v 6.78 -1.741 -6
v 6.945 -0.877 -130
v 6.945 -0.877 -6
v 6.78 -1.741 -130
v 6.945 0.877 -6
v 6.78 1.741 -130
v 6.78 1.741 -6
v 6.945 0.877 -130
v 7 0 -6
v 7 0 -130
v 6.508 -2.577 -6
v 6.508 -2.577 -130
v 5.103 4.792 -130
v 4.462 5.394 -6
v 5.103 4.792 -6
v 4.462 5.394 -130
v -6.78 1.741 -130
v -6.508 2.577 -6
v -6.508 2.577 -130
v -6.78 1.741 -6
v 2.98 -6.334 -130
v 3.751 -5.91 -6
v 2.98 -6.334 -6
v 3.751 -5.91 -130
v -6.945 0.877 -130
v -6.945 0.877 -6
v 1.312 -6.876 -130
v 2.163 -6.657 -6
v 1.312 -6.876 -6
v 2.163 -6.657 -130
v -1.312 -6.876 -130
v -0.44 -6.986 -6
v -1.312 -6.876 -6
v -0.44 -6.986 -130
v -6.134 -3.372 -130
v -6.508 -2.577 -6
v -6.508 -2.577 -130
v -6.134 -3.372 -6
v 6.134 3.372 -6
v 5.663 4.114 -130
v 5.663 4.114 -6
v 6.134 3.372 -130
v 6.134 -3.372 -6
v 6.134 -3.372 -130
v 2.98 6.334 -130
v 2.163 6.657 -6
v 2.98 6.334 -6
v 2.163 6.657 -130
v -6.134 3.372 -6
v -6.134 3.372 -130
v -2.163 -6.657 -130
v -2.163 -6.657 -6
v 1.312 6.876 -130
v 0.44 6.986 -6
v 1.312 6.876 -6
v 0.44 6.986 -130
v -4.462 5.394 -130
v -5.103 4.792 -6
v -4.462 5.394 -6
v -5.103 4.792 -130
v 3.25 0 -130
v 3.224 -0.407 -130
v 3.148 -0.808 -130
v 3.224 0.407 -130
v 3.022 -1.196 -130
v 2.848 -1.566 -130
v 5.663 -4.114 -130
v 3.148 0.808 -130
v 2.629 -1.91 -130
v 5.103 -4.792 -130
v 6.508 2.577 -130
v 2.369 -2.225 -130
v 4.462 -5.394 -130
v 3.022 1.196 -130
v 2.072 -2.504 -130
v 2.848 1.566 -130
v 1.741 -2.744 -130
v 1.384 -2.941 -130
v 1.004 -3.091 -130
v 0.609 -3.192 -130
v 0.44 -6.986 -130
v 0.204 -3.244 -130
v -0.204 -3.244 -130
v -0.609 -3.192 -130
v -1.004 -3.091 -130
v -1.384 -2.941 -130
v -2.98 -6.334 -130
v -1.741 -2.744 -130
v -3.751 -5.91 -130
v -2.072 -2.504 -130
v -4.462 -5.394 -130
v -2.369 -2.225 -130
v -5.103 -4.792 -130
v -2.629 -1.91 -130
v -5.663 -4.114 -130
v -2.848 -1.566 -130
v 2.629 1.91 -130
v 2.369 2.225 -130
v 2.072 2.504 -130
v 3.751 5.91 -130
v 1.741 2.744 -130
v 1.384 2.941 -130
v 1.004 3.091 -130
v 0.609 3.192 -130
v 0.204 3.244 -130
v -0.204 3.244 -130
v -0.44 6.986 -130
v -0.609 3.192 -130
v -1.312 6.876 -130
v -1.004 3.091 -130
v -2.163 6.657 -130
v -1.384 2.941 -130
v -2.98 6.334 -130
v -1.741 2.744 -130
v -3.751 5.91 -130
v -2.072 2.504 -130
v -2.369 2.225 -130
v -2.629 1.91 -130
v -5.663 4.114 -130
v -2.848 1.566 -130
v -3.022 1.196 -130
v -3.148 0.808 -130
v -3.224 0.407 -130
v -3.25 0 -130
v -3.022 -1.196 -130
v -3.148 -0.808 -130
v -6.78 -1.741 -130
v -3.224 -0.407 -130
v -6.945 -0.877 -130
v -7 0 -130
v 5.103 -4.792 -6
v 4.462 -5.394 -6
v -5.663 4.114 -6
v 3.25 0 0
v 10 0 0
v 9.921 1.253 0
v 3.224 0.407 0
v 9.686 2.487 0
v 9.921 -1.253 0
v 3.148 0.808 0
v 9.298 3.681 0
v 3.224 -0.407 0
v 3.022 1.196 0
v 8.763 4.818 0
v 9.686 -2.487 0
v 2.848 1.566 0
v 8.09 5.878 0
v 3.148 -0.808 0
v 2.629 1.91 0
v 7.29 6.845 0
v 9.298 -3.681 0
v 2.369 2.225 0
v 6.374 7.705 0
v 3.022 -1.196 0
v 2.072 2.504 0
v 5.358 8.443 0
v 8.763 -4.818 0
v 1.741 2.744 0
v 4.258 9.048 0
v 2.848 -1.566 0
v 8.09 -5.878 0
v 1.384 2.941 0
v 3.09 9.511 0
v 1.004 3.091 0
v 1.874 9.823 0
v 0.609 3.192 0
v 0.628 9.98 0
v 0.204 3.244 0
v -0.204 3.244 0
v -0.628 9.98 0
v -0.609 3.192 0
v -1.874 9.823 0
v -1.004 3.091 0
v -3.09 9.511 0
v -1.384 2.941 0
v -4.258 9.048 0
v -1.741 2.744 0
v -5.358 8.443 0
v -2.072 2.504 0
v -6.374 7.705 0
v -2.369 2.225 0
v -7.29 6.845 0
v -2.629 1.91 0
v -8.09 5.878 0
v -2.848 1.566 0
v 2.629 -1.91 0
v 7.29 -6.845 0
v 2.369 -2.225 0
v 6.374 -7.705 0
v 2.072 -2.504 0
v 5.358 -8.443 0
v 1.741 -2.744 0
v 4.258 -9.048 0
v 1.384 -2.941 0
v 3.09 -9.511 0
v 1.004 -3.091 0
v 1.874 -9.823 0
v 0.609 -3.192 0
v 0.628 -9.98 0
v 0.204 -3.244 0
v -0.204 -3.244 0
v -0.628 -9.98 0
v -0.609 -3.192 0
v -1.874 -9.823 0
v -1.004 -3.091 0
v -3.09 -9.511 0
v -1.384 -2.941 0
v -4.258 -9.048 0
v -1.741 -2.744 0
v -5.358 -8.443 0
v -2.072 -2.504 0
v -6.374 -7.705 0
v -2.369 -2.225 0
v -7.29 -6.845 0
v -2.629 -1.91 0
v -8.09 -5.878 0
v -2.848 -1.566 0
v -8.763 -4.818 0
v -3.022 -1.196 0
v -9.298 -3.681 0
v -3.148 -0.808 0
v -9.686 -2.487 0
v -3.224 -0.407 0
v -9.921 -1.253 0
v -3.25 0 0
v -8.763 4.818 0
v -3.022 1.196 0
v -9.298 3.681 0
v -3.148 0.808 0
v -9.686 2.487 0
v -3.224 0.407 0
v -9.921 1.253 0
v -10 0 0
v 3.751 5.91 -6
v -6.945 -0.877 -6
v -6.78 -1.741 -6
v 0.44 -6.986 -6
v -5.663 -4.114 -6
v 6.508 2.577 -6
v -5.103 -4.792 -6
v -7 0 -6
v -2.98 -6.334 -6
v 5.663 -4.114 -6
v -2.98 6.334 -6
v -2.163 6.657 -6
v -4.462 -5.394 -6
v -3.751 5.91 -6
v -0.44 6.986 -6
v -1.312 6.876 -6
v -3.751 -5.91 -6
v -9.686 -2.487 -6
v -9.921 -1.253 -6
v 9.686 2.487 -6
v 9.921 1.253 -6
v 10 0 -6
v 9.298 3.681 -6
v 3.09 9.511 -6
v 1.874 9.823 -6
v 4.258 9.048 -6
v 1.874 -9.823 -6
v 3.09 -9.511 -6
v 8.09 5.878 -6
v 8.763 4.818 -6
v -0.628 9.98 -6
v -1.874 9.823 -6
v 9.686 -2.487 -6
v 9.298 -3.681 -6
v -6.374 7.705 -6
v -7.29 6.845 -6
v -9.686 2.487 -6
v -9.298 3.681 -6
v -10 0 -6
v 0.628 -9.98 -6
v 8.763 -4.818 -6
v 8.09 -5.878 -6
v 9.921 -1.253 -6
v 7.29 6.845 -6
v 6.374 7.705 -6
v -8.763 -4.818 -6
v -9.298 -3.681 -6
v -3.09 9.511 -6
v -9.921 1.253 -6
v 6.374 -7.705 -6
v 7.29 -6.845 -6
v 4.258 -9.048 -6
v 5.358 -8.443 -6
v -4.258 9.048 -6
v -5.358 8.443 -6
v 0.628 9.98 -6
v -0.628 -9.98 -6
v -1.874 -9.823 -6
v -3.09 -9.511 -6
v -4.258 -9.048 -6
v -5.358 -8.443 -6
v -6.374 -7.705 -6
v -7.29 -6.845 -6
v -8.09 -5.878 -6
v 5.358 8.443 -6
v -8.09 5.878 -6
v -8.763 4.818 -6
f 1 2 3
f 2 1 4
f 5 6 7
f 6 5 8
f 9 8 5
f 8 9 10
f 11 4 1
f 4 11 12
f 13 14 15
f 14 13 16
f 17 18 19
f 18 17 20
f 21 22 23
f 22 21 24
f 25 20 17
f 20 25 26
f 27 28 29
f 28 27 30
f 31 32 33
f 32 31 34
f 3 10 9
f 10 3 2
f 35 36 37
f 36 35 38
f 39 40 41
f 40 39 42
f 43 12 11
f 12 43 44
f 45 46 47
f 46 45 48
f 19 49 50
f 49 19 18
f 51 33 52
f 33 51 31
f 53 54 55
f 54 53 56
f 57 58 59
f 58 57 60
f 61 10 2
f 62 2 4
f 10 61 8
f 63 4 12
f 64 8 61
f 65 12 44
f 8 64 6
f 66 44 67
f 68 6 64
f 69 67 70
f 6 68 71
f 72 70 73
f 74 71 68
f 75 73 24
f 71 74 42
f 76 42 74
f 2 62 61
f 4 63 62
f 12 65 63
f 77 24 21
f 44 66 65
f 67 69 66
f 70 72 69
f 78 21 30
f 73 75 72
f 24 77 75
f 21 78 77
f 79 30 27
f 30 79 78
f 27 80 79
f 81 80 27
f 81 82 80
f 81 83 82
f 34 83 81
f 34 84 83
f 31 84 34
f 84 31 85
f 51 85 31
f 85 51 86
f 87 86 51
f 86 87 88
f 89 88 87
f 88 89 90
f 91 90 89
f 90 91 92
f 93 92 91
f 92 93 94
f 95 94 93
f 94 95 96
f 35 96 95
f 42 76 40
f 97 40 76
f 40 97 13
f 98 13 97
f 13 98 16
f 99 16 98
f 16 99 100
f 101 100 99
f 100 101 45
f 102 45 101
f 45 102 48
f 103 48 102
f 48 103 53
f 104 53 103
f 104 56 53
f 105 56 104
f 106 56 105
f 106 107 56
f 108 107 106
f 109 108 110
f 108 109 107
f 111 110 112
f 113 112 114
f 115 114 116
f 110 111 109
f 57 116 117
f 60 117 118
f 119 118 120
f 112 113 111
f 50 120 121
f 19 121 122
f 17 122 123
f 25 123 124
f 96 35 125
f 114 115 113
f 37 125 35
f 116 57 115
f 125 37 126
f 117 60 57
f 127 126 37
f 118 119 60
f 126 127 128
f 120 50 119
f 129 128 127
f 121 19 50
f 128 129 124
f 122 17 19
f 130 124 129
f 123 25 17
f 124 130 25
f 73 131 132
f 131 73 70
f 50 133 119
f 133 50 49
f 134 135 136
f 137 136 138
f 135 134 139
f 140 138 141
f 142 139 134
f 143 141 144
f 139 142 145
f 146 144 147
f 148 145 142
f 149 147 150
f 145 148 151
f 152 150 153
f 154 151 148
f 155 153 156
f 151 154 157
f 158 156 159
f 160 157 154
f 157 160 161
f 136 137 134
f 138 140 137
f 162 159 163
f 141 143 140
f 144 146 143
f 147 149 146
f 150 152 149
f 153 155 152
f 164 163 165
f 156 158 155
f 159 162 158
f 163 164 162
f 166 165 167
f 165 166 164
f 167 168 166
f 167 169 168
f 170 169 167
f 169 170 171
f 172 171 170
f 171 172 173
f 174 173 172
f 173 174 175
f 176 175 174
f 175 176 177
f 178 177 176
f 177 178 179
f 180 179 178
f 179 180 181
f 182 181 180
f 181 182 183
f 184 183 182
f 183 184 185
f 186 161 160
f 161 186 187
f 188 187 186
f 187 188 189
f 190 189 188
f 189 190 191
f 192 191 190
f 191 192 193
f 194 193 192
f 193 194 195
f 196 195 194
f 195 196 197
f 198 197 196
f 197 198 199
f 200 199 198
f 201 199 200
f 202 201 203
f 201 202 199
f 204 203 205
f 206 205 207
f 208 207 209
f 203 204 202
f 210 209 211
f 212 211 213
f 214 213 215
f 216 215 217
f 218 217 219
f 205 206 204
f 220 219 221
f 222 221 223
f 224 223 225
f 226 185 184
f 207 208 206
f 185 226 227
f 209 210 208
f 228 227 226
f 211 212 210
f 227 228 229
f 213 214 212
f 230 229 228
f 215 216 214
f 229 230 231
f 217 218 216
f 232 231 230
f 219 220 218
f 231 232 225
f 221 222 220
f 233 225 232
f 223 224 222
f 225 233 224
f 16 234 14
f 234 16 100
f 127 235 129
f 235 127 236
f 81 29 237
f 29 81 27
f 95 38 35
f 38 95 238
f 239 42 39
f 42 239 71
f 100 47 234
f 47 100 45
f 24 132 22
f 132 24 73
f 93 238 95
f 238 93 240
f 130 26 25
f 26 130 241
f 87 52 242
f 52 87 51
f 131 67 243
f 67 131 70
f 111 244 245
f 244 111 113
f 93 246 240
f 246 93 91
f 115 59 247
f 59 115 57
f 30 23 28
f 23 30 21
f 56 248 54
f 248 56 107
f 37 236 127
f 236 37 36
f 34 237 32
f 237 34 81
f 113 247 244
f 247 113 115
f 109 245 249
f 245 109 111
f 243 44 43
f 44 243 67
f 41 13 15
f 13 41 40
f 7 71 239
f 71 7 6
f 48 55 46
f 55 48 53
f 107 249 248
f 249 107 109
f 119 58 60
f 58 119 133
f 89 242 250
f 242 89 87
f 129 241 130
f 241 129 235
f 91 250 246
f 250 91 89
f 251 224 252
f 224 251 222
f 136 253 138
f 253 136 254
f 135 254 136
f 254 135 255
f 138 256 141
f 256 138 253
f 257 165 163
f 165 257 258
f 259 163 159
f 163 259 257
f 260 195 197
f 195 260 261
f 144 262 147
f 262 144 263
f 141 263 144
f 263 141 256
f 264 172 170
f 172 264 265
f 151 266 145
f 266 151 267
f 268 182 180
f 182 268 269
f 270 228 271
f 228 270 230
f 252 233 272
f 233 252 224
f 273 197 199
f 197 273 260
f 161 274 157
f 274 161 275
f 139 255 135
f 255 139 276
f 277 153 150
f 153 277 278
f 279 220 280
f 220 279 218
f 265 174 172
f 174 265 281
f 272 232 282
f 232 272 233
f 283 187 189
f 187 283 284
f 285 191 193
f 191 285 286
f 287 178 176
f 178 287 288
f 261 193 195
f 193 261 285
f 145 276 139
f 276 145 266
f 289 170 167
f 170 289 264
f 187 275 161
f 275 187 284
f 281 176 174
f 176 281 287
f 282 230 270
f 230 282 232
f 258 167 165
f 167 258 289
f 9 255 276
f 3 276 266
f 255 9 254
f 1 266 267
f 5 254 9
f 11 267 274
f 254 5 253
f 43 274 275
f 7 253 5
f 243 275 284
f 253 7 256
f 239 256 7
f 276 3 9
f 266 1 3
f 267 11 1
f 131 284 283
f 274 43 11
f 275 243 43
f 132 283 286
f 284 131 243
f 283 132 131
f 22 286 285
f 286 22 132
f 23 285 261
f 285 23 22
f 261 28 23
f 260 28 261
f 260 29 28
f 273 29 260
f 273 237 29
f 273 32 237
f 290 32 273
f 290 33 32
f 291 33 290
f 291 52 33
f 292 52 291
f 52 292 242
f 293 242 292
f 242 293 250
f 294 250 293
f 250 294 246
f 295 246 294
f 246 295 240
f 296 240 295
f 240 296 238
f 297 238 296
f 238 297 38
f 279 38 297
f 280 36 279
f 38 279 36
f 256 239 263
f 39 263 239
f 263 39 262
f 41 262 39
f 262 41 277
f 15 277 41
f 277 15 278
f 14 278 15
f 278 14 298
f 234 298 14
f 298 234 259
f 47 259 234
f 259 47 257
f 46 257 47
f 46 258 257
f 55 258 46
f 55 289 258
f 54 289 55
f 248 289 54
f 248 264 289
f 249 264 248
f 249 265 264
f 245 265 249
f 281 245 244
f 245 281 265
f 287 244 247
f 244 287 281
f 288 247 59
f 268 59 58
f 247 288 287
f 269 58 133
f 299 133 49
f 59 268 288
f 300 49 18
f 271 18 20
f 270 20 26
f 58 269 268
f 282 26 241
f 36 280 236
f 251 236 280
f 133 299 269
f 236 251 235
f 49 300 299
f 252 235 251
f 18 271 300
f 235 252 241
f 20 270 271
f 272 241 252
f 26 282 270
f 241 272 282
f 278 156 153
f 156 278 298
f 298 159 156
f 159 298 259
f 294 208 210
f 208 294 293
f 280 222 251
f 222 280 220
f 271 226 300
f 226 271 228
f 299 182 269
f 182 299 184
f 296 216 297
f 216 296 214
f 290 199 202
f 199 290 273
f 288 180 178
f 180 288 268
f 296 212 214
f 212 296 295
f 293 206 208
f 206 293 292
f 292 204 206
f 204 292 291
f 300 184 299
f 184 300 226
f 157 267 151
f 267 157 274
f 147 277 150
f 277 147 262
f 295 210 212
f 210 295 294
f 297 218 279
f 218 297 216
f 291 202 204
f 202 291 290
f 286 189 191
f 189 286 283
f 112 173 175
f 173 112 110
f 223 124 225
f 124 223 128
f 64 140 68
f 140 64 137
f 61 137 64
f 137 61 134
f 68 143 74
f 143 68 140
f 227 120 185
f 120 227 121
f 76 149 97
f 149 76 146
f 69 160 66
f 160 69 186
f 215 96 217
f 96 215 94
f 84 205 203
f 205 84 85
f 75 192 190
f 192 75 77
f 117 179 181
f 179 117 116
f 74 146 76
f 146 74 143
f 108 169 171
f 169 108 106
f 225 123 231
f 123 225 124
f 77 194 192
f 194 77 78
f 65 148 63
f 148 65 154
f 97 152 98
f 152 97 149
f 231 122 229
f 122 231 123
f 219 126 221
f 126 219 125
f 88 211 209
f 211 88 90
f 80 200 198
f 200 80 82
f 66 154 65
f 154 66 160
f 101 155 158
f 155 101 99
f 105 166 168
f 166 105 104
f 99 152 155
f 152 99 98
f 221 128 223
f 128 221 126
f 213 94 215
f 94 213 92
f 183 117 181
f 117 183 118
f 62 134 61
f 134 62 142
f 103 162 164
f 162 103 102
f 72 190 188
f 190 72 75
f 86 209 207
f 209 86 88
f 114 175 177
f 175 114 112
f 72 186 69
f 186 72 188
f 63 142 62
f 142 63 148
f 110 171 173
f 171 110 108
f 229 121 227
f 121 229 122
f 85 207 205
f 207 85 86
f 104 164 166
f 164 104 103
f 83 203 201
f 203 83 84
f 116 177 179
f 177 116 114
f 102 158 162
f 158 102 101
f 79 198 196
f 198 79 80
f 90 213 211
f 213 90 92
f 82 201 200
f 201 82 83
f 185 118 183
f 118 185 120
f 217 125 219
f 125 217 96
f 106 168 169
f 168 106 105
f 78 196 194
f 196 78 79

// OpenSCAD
$fn = 50;


difference() {
	union() {
		translate(v = [0, 0, -130.0000000000]) {
			cylinder(h = 130, r = 7.0000000000);
		}
		translate(v = [0, 0, -6.0000000000]) {
			cylinder(h = 6, r = 10.0000000000);
		}
	}
	union() {
		#translate(v = [0, 0, -130]) {
			cylinder(h = 130, r = 3.2500000000);
		}
	}
}
